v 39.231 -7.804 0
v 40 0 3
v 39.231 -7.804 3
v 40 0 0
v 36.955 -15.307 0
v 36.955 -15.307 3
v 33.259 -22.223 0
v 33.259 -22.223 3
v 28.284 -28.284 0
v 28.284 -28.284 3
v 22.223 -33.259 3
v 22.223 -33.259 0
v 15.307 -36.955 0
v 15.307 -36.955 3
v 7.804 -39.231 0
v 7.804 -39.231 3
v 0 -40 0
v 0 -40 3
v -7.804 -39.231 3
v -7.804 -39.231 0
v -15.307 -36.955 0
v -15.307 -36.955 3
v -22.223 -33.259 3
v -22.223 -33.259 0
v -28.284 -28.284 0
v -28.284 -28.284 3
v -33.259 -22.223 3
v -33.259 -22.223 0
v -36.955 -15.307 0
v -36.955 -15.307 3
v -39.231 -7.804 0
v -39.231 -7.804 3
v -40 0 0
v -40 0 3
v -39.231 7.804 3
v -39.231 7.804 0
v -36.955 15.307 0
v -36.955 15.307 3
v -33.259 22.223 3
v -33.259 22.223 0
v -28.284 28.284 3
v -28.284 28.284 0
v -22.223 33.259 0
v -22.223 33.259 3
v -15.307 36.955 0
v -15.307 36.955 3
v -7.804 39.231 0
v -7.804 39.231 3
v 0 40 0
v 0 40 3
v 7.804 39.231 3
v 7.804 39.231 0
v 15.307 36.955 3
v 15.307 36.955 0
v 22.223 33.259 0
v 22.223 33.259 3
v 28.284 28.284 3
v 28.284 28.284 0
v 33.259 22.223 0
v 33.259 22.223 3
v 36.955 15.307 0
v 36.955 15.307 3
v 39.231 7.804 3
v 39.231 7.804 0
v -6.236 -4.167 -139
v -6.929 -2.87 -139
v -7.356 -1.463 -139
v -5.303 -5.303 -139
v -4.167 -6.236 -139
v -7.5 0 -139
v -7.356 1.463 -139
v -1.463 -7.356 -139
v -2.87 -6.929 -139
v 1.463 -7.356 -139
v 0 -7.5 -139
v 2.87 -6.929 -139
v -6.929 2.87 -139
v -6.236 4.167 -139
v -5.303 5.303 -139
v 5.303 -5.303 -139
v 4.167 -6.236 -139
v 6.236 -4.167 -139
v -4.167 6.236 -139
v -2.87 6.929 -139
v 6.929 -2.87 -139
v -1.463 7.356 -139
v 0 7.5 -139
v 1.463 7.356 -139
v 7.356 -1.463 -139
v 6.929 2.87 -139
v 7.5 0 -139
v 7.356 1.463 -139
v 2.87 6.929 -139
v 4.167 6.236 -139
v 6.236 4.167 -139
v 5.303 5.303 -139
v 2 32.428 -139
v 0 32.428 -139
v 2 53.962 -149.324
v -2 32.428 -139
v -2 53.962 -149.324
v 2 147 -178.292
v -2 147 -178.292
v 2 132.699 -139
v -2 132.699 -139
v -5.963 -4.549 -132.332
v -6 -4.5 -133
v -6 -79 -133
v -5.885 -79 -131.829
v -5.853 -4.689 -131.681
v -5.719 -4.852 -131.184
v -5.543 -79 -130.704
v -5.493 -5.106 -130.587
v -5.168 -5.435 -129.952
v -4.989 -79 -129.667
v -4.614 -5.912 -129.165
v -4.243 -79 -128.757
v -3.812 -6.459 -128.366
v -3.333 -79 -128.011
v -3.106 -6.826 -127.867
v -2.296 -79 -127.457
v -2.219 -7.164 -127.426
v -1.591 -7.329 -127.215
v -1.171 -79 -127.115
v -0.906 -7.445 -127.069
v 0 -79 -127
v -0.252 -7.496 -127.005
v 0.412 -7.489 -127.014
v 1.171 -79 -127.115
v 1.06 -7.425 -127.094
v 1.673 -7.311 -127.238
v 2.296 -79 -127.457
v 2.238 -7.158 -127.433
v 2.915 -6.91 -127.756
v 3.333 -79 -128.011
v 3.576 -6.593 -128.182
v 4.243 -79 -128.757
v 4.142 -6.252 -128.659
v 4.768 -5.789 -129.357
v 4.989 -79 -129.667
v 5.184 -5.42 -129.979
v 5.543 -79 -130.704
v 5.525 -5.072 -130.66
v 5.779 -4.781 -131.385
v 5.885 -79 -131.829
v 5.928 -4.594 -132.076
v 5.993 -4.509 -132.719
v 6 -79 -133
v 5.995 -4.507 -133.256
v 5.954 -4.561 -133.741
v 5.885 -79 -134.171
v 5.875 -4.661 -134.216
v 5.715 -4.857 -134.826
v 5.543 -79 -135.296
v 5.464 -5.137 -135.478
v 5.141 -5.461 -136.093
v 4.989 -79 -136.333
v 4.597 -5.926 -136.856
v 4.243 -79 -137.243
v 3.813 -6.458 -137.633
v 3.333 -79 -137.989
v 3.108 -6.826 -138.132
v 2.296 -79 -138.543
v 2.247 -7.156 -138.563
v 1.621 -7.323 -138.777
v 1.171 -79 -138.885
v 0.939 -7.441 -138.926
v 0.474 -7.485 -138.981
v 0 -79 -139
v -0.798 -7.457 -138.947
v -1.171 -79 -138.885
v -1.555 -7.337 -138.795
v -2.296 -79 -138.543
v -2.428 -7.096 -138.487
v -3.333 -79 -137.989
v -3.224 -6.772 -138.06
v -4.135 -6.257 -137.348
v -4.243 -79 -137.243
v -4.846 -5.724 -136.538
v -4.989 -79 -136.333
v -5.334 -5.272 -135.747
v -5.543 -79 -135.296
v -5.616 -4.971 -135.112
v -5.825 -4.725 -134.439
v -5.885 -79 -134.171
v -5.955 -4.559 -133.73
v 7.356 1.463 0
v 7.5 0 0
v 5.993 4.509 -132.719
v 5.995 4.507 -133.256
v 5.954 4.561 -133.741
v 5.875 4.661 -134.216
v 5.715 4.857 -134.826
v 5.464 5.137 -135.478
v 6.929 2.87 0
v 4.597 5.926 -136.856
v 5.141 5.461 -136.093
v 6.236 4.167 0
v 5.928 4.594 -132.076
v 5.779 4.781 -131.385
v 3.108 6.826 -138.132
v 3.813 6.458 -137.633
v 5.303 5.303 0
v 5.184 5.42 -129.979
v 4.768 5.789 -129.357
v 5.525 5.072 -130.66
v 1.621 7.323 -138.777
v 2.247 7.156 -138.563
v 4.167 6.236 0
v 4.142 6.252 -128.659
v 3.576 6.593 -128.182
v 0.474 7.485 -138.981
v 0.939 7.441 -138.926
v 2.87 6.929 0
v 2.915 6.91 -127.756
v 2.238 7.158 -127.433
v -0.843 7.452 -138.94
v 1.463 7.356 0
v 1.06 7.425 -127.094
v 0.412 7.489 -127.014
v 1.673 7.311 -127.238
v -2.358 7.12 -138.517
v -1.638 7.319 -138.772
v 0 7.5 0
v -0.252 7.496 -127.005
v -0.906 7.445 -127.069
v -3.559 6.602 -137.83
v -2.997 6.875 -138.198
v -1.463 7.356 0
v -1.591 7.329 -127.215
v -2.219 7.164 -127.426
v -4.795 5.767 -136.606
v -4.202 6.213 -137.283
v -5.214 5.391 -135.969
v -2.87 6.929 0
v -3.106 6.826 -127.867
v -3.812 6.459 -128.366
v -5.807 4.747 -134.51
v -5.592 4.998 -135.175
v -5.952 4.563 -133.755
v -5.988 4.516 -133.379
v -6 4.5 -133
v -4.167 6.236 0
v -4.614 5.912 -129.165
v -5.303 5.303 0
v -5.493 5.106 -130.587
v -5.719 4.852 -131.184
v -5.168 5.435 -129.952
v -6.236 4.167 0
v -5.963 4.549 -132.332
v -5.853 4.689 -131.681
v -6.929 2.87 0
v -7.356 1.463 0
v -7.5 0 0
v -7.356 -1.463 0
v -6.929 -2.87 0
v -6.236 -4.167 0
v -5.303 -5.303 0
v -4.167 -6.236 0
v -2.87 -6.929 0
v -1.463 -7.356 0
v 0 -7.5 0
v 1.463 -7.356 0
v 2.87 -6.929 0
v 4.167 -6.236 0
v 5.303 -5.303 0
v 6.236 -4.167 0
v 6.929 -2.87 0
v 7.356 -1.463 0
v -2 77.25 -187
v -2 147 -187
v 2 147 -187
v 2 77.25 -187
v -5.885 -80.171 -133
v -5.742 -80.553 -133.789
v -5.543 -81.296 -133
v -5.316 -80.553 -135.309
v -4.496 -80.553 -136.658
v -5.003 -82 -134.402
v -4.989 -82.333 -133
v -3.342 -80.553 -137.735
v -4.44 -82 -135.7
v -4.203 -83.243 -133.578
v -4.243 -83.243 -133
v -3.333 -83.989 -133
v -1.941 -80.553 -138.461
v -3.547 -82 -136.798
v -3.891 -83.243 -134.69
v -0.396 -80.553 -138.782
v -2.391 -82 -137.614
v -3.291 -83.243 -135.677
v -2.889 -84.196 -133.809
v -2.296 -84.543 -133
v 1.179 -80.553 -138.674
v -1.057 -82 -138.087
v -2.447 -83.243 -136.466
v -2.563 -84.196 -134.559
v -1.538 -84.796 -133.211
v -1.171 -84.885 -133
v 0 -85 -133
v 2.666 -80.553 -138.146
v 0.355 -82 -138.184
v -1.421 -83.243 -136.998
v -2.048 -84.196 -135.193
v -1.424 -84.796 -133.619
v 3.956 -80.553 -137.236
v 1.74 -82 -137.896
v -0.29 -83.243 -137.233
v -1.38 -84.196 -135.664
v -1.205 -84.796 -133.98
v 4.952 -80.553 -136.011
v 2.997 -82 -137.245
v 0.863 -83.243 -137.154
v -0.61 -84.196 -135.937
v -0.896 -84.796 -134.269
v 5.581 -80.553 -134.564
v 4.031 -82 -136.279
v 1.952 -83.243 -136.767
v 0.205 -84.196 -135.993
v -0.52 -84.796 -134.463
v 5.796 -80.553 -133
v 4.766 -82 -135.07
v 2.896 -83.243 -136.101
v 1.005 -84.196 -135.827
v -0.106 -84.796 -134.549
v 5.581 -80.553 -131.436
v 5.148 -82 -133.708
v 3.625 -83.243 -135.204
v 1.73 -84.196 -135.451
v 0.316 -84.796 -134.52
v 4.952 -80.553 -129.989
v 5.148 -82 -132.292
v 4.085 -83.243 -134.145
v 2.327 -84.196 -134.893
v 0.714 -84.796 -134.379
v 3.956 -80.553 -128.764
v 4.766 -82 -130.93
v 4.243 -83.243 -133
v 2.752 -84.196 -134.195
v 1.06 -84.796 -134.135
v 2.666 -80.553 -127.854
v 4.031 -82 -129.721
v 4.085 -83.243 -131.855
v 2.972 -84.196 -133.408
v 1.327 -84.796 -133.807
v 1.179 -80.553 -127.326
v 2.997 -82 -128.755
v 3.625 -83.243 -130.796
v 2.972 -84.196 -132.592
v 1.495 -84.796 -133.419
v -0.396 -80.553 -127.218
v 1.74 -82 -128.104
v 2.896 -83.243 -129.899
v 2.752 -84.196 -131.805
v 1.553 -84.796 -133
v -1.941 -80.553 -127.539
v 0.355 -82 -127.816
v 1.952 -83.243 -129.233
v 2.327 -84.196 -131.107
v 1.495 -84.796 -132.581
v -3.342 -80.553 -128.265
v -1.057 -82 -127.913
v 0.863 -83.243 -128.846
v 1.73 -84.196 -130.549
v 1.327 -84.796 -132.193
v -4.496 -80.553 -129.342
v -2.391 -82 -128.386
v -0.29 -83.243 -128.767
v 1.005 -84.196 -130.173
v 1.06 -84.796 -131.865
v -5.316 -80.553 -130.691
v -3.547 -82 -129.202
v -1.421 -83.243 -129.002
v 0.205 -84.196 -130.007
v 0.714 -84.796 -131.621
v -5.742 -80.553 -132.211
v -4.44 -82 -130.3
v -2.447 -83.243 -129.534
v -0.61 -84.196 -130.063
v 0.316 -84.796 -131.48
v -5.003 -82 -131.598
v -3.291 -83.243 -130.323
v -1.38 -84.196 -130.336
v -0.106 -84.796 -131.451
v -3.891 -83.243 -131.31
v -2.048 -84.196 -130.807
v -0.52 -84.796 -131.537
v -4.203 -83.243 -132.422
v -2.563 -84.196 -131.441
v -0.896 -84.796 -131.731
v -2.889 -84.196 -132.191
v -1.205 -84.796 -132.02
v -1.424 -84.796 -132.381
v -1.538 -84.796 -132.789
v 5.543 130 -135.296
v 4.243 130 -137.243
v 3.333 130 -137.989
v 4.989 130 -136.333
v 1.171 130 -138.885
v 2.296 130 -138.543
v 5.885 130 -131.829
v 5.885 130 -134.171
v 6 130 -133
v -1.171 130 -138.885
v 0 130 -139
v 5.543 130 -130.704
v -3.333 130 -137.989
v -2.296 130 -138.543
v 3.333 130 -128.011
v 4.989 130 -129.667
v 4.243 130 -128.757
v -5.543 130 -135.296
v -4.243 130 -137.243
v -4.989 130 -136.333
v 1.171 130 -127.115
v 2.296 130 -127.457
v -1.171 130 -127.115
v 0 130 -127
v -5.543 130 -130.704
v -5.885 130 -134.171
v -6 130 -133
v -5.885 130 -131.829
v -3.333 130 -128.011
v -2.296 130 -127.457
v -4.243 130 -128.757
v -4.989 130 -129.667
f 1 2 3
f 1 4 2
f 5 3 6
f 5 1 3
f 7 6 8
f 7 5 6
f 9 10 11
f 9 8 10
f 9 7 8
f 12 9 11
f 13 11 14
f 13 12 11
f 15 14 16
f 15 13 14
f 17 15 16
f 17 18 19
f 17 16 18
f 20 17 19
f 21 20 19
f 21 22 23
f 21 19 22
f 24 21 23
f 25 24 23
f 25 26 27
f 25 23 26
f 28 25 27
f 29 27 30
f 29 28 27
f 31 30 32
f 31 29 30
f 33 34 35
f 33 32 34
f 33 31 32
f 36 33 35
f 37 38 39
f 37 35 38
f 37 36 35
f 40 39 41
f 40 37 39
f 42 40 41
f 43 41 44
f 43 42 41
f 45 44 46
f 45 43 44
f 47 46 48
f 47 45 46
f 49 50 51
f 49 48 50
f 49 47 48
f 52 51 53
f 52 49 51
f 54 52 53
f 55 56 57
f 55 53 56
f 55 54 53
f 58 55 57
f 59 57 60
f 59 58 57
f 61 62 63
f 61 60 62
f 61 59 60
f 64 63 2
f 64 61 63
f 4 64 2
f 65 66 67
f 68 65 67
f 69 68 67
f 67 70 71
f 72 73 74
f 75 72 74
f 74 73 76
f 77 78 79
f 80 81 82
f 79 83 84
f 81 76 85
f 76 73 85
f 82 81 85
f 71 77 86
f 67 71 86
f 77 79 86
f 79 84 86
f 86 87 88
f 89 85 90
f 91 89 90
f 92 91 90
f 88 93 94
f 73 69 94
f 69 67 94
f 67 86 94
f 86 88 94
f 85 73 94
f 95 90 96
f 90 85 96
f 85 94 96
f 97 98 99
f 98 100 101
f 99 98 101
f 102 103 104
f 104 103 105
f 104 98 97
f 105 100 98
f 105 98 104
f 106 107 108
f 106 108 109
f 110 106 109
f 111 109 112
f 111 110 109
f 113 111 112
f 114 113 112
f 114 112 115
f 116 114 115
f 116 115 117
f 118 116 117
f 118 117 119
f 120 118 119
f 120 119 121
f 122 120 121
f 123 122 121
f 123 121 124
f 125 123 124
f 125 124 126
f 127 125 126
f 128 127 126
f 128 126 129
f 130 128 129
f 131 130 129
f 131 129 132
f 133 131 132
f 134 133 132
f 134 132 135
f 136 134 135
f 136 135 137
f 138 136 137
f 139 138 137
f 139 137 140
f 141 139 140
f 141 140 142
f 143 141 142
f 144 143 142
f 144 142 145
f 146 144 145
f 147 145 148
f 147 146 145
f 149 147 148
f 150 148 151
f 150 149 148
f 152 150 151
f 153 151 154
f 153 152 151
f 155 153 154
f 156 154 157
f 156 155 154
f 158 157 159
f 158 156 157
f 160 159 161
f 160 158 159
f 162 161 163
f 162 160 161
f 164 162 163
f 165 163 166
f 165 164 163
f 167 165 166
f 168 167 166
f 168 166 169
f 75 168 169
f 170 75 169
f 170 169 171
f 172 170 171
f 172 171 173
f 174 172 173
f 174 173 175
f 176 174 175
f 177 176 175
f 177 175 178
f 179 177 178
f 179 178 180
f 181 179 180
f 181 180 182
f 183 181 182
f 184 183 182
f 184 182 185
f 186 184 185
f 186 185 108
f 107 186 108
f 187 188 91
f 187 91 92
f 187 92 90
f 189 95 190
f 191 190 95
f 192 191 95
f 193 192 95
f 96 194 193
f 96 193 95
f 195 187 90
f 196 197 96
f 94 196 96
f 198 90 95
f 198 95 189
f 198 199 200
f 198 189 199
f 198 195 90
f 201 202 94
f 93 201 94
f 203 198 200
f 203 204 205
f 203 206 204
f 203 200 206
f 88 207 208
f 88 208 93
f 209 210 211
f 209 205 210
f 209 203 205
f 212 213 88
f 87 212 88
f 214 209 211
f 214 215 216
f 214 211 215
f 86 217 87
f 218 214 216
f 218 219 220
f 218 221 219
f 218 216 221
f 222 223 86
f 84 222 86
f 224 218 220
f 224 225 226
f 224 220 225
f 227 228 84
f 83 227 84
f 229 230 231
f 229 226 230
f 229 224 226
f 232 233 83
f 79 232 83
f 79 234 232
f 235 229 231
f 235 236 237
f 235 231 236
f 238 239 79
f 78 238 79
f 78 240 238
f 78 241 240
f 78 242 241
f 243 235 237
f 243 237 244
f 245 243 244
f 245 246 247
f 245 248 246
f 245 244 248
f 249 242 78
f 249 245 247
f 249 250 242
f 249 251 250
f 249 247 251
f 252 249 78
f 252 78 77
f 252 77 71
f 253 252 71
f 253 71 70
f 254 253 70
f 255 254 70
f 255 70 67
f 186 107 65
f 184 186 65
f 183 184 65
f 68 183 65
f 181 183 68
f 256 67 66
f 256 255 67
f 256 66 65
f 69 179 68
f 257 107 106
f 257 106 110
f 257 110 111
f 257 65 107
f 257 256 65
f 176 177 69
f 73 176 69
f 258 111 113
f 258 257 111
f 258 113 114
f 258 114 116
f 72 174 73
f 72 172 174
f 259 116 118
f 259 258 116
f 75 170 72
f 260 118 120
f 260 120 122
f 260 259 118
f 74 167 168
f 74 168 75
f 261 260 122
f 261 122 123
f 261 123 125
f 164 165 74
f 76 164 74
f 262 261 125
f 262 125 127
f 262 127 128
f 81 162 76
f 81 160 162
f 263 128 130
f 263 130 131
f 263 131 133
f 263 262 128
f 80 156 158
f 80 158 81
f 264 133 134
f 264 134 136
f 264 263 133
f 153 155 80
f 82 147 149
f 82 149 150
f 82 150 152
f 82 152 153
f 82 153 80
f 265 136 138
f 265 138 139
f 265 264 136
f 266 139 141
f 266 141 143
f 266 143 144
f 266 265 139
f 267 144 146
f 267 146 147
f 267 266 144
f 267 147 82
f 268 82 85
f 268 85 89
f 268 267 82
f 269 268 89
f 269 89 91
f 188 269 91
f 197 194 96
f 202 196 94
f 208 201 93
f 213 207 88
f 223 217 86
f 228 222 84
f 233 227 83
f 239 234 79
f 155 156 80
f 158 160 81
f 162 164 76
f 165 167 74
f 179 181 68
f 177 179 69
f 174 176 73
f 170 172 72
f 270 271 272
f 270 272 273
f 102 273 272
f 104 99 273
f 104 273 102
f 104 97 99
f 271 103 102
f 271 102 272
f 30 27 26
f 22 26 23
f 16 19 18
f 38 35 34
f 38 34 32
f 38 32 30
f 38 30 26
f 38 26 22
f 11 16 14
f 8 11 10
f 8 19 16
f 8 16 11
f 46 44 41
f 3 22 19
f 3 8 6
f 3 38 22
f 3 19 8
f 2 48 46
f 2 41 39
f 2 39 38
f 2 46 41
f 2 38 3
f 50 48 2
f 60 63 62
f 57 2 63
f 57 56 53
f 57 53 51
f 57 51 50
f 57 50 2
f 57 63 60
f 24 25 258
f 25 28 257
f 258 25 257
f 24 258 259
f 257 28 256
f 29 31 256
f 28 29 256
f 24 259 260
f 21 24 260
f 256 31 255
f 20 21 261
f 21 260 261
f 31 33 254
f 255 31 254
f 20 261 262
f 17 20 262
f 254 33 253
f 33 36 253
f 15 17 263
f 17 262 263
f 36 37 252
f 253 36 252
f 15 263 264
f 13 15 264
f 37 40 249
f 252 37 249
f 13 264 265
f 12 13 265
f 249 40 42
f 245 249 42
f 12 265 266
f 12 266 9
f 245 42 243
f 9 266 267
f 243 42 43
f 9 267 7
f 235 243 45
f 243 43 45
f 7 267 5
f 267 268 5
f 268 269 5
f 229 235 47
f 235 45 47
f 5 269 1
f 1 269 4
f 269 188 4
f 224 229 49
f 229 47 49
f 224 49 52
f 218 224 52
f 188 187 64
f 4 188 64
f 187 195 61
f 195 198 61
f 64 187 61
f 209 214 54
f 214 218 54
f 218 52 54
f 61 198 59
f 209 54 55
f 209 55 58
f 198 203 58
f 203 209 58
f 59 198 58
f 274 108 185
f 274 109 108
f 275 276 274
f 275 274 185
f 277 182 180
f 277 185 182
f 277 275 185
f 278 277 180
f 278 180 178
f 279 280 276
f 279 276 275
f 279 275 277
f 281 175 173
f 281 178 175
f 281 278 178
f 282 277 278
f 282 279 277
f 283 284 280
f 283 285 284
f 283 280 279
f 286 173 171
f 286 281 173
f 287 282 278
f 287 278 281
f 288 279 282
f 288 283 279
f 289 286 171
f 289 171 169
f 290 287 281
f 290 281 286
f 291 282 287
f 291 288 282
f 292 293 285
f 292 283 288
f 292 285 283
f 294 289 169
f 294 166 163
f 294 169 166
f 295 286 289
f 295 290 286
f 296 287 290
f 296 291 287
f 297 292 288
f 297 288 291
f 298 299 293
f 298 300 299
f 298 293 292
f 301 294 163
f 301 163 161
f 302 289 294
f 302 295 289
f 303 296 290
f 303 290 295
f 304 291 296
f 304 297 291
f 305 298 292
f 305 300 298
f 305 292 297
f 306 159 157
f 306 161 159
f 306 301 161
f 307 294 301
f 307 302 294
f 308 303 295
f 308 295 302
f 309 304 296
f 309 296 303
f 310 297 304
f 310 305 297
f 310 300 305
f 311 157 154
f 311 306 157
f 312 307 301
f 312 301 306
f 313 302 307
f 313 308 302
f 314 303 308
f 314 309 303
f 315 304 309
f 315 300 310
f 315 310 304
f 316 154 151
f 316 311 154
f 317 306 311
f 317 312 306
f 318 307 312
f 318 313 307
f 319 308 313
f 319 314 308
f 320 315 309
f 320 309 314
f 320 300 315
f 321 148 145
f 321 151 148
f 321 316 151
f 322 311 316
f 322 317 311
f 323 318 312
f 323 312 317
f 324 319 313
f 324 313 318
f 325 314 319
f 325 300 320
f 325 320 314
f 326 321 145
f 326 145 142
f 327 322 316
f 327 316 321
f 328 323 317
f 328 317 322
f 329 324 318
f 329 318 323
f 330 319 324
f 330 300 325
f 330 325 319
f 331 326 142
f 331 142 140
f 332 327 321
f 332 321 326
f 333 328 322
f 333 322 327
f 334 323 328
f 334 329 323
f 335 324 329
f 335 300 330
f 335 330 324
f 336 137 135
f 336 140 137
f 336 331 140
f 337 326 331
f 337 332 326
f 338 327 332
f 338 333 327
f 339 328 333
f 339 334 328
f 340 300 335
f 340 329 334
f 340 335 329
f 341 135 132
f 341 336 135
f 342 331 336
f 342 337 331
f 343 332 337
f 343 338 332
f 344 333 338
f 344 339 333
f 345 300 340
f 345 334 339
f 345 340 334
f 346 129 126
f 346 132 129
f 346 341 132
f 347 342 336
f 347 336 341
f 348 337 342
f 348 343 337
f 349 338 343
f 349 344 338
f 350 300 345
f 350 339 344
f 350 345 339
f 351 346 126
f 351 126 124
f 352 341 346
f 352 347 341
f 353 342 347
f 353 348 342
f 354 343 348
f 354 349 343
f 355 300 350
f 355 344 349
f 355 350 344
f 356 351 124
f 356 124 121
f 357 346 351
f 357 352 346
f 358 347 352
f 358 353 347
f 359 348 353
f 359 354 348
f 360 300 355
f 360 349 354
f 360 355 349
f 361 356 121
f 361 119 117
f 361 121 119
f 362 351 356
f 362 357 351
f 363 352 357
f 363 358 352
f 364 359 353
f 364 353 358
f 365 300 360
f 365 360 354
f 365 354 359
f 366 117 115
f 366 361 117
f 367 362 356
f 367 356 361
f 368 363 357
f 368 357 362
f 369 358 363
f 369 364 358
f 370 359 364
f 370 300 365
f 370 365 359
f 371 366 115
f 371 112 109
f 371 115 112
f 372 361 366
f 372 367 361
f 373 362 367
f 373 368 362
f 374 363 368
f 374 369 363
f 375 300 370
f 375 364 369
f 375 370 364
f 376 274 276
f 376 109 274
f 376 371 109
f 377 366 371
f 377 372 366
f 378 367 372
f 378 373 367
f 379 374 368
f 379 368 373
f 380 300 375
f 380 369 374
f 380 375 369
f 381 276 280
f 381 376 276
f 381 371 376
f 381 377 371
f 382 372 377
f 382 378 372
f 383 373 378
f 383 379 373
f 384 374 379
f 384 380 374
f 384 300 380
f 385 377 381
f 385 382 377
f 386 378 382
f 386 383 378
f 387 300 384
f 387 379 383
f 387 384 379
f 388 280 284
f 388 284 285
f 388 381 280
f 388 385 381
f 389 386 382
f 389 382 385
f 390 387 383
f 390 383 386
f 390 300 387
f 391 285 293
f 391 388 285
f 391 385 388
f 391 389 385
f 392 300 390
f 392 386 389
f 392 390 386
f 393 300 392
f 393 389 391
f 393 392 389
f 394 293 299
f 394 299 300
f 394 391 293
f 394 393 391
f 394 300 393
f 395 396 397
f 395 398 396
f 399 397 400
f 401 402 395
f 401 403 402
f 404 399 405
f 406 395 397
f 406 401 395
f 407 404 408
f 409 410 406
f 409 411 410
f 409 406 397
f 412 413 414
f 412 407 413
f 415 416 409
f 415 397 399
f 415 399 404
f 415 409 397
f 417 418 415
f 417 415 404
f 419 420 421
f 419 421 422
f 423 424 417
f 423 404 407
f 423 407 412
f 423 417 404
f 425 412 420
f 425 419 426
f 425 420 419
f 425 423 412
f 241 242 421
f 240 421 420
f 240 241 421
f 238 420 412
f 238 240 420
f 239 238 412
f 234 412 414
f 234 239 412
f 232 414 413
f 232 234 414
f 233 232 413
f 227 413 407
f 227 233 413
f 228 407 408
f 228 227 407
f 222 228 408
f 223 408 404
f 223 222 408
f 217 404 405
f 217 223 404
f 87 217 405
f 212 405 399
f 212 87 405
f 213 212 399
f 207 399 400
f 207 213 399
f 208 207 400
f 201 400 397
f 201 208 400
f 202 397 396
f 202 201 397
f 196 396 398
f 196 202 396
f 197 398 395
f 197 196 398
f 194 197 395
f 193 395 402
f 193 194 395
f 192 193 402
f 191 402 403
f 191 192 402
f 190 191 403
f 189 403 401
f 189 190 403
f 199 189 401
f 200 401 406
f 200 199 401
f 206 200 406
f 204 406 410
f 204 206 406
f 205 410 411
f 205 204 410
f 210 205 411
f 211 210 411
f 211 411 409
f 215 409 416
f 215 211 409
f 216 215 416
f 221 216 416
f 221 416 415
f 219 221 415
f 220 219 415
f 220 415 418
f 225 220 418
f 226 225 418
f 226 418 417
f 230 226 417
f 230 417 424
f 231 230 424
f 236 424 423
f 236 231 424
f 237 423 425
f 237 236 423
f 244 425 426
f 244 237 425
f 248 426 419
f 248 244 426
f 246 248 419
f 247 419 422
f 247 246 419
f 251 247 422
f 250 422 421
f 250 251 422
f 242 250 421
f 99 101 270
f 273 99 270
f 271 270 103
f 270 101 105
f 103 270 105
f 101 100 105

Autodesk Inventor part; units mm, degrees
ref_plane "YZ Plane" through (0, 0, 0) normal (1, 0, 0) x (0, 1, 0)
ref_plane "XZ Plane" through (0, 0, 0) normal (0, 1, 0) x (-1, 0, 0)
ref_plane "XY Plane" through (0, 0, 0) normal (0, 0, 1) x (1, 0, 0)
sketch "Sketch1" plane through (0, 0, 0) normal (0, 0, 1) x (1, 0, 0)
  circle A0 centre (0, 0) radius 40
  dimension "d0" = 80
extrude "Extrusion1" add sketch "Sketch1" along normal blind 3
sketch "Sketch2" plane through (0, 0, 3) normal (0, 0, 1) x (1, 0, 0)
  circle A0 centre (0, 0) radius 7.5
  dimension "d3" = 15
extrude "Extrusion2" add sketch "Sketch2" against normal blind 142
sketch "Sketch3" plane through (0, 0, 0) normal (0, 1, 0) x (-1, 0, 0)
  circle A0 centre (0, -133) radius 6
  line L0 (-7.5, -139) -> (7.5, -139) projected
  line L1 (7.5, -139) -> (-7.5, -139)
  point P0 (0, 0)
  dimension "d6" = 12
extrude "Extrusion3" add sketch "Sketch3" along normal blind 130 and the other way blind 85
fillet "Fillet1" radius 6 1 edges at (6, -85, -133)
sketch "Sketch4" plane through (0, 0, 0) normal (1, 0, 0) x (0, 1, 0)
  line L0 (-7.5, -139) -> (7.5, -139) projected
  line L1 (0, -139) -> (147, -139)
  line L2 (147, -139) -> (147, -187)
  line L3 (147, -187) -> (0, -187)
  line L4 (0, -187) -> (0, -139)
  line L5 (147, -178.2918) -> (122.4089, -110.7284)
  line L6 (147, -178.2918) -> (218.8994, -178.2918) construction
  line L7 (7.5, -139) -> (130, -139) projected
  line L8 (32.4283, -139) -> (53.9618, -149.3242)
  line L9 (53.9618, -149.3242) -> (77.25, -187)
  line L10 (131.293, -135.1372) -> (26.6385, -135.1372)
  line L11 (32.4283, -139) -> (23.511, -135.1372)
  line L12 (23.511, -135.1372) -> (26.6385, -135.1372)
  point P0 (0, 0)
  point P1 (132.699, -139)
  dimension "d12" = 147
  dimension "d13" = 48
  dimension "d14" = 110
extrude "Extrusion4" add sketch "Sketch4" along normal mid plane 4 contours L1 L5 L2 L3 L9 L8
properties part number "direzione del vento"
